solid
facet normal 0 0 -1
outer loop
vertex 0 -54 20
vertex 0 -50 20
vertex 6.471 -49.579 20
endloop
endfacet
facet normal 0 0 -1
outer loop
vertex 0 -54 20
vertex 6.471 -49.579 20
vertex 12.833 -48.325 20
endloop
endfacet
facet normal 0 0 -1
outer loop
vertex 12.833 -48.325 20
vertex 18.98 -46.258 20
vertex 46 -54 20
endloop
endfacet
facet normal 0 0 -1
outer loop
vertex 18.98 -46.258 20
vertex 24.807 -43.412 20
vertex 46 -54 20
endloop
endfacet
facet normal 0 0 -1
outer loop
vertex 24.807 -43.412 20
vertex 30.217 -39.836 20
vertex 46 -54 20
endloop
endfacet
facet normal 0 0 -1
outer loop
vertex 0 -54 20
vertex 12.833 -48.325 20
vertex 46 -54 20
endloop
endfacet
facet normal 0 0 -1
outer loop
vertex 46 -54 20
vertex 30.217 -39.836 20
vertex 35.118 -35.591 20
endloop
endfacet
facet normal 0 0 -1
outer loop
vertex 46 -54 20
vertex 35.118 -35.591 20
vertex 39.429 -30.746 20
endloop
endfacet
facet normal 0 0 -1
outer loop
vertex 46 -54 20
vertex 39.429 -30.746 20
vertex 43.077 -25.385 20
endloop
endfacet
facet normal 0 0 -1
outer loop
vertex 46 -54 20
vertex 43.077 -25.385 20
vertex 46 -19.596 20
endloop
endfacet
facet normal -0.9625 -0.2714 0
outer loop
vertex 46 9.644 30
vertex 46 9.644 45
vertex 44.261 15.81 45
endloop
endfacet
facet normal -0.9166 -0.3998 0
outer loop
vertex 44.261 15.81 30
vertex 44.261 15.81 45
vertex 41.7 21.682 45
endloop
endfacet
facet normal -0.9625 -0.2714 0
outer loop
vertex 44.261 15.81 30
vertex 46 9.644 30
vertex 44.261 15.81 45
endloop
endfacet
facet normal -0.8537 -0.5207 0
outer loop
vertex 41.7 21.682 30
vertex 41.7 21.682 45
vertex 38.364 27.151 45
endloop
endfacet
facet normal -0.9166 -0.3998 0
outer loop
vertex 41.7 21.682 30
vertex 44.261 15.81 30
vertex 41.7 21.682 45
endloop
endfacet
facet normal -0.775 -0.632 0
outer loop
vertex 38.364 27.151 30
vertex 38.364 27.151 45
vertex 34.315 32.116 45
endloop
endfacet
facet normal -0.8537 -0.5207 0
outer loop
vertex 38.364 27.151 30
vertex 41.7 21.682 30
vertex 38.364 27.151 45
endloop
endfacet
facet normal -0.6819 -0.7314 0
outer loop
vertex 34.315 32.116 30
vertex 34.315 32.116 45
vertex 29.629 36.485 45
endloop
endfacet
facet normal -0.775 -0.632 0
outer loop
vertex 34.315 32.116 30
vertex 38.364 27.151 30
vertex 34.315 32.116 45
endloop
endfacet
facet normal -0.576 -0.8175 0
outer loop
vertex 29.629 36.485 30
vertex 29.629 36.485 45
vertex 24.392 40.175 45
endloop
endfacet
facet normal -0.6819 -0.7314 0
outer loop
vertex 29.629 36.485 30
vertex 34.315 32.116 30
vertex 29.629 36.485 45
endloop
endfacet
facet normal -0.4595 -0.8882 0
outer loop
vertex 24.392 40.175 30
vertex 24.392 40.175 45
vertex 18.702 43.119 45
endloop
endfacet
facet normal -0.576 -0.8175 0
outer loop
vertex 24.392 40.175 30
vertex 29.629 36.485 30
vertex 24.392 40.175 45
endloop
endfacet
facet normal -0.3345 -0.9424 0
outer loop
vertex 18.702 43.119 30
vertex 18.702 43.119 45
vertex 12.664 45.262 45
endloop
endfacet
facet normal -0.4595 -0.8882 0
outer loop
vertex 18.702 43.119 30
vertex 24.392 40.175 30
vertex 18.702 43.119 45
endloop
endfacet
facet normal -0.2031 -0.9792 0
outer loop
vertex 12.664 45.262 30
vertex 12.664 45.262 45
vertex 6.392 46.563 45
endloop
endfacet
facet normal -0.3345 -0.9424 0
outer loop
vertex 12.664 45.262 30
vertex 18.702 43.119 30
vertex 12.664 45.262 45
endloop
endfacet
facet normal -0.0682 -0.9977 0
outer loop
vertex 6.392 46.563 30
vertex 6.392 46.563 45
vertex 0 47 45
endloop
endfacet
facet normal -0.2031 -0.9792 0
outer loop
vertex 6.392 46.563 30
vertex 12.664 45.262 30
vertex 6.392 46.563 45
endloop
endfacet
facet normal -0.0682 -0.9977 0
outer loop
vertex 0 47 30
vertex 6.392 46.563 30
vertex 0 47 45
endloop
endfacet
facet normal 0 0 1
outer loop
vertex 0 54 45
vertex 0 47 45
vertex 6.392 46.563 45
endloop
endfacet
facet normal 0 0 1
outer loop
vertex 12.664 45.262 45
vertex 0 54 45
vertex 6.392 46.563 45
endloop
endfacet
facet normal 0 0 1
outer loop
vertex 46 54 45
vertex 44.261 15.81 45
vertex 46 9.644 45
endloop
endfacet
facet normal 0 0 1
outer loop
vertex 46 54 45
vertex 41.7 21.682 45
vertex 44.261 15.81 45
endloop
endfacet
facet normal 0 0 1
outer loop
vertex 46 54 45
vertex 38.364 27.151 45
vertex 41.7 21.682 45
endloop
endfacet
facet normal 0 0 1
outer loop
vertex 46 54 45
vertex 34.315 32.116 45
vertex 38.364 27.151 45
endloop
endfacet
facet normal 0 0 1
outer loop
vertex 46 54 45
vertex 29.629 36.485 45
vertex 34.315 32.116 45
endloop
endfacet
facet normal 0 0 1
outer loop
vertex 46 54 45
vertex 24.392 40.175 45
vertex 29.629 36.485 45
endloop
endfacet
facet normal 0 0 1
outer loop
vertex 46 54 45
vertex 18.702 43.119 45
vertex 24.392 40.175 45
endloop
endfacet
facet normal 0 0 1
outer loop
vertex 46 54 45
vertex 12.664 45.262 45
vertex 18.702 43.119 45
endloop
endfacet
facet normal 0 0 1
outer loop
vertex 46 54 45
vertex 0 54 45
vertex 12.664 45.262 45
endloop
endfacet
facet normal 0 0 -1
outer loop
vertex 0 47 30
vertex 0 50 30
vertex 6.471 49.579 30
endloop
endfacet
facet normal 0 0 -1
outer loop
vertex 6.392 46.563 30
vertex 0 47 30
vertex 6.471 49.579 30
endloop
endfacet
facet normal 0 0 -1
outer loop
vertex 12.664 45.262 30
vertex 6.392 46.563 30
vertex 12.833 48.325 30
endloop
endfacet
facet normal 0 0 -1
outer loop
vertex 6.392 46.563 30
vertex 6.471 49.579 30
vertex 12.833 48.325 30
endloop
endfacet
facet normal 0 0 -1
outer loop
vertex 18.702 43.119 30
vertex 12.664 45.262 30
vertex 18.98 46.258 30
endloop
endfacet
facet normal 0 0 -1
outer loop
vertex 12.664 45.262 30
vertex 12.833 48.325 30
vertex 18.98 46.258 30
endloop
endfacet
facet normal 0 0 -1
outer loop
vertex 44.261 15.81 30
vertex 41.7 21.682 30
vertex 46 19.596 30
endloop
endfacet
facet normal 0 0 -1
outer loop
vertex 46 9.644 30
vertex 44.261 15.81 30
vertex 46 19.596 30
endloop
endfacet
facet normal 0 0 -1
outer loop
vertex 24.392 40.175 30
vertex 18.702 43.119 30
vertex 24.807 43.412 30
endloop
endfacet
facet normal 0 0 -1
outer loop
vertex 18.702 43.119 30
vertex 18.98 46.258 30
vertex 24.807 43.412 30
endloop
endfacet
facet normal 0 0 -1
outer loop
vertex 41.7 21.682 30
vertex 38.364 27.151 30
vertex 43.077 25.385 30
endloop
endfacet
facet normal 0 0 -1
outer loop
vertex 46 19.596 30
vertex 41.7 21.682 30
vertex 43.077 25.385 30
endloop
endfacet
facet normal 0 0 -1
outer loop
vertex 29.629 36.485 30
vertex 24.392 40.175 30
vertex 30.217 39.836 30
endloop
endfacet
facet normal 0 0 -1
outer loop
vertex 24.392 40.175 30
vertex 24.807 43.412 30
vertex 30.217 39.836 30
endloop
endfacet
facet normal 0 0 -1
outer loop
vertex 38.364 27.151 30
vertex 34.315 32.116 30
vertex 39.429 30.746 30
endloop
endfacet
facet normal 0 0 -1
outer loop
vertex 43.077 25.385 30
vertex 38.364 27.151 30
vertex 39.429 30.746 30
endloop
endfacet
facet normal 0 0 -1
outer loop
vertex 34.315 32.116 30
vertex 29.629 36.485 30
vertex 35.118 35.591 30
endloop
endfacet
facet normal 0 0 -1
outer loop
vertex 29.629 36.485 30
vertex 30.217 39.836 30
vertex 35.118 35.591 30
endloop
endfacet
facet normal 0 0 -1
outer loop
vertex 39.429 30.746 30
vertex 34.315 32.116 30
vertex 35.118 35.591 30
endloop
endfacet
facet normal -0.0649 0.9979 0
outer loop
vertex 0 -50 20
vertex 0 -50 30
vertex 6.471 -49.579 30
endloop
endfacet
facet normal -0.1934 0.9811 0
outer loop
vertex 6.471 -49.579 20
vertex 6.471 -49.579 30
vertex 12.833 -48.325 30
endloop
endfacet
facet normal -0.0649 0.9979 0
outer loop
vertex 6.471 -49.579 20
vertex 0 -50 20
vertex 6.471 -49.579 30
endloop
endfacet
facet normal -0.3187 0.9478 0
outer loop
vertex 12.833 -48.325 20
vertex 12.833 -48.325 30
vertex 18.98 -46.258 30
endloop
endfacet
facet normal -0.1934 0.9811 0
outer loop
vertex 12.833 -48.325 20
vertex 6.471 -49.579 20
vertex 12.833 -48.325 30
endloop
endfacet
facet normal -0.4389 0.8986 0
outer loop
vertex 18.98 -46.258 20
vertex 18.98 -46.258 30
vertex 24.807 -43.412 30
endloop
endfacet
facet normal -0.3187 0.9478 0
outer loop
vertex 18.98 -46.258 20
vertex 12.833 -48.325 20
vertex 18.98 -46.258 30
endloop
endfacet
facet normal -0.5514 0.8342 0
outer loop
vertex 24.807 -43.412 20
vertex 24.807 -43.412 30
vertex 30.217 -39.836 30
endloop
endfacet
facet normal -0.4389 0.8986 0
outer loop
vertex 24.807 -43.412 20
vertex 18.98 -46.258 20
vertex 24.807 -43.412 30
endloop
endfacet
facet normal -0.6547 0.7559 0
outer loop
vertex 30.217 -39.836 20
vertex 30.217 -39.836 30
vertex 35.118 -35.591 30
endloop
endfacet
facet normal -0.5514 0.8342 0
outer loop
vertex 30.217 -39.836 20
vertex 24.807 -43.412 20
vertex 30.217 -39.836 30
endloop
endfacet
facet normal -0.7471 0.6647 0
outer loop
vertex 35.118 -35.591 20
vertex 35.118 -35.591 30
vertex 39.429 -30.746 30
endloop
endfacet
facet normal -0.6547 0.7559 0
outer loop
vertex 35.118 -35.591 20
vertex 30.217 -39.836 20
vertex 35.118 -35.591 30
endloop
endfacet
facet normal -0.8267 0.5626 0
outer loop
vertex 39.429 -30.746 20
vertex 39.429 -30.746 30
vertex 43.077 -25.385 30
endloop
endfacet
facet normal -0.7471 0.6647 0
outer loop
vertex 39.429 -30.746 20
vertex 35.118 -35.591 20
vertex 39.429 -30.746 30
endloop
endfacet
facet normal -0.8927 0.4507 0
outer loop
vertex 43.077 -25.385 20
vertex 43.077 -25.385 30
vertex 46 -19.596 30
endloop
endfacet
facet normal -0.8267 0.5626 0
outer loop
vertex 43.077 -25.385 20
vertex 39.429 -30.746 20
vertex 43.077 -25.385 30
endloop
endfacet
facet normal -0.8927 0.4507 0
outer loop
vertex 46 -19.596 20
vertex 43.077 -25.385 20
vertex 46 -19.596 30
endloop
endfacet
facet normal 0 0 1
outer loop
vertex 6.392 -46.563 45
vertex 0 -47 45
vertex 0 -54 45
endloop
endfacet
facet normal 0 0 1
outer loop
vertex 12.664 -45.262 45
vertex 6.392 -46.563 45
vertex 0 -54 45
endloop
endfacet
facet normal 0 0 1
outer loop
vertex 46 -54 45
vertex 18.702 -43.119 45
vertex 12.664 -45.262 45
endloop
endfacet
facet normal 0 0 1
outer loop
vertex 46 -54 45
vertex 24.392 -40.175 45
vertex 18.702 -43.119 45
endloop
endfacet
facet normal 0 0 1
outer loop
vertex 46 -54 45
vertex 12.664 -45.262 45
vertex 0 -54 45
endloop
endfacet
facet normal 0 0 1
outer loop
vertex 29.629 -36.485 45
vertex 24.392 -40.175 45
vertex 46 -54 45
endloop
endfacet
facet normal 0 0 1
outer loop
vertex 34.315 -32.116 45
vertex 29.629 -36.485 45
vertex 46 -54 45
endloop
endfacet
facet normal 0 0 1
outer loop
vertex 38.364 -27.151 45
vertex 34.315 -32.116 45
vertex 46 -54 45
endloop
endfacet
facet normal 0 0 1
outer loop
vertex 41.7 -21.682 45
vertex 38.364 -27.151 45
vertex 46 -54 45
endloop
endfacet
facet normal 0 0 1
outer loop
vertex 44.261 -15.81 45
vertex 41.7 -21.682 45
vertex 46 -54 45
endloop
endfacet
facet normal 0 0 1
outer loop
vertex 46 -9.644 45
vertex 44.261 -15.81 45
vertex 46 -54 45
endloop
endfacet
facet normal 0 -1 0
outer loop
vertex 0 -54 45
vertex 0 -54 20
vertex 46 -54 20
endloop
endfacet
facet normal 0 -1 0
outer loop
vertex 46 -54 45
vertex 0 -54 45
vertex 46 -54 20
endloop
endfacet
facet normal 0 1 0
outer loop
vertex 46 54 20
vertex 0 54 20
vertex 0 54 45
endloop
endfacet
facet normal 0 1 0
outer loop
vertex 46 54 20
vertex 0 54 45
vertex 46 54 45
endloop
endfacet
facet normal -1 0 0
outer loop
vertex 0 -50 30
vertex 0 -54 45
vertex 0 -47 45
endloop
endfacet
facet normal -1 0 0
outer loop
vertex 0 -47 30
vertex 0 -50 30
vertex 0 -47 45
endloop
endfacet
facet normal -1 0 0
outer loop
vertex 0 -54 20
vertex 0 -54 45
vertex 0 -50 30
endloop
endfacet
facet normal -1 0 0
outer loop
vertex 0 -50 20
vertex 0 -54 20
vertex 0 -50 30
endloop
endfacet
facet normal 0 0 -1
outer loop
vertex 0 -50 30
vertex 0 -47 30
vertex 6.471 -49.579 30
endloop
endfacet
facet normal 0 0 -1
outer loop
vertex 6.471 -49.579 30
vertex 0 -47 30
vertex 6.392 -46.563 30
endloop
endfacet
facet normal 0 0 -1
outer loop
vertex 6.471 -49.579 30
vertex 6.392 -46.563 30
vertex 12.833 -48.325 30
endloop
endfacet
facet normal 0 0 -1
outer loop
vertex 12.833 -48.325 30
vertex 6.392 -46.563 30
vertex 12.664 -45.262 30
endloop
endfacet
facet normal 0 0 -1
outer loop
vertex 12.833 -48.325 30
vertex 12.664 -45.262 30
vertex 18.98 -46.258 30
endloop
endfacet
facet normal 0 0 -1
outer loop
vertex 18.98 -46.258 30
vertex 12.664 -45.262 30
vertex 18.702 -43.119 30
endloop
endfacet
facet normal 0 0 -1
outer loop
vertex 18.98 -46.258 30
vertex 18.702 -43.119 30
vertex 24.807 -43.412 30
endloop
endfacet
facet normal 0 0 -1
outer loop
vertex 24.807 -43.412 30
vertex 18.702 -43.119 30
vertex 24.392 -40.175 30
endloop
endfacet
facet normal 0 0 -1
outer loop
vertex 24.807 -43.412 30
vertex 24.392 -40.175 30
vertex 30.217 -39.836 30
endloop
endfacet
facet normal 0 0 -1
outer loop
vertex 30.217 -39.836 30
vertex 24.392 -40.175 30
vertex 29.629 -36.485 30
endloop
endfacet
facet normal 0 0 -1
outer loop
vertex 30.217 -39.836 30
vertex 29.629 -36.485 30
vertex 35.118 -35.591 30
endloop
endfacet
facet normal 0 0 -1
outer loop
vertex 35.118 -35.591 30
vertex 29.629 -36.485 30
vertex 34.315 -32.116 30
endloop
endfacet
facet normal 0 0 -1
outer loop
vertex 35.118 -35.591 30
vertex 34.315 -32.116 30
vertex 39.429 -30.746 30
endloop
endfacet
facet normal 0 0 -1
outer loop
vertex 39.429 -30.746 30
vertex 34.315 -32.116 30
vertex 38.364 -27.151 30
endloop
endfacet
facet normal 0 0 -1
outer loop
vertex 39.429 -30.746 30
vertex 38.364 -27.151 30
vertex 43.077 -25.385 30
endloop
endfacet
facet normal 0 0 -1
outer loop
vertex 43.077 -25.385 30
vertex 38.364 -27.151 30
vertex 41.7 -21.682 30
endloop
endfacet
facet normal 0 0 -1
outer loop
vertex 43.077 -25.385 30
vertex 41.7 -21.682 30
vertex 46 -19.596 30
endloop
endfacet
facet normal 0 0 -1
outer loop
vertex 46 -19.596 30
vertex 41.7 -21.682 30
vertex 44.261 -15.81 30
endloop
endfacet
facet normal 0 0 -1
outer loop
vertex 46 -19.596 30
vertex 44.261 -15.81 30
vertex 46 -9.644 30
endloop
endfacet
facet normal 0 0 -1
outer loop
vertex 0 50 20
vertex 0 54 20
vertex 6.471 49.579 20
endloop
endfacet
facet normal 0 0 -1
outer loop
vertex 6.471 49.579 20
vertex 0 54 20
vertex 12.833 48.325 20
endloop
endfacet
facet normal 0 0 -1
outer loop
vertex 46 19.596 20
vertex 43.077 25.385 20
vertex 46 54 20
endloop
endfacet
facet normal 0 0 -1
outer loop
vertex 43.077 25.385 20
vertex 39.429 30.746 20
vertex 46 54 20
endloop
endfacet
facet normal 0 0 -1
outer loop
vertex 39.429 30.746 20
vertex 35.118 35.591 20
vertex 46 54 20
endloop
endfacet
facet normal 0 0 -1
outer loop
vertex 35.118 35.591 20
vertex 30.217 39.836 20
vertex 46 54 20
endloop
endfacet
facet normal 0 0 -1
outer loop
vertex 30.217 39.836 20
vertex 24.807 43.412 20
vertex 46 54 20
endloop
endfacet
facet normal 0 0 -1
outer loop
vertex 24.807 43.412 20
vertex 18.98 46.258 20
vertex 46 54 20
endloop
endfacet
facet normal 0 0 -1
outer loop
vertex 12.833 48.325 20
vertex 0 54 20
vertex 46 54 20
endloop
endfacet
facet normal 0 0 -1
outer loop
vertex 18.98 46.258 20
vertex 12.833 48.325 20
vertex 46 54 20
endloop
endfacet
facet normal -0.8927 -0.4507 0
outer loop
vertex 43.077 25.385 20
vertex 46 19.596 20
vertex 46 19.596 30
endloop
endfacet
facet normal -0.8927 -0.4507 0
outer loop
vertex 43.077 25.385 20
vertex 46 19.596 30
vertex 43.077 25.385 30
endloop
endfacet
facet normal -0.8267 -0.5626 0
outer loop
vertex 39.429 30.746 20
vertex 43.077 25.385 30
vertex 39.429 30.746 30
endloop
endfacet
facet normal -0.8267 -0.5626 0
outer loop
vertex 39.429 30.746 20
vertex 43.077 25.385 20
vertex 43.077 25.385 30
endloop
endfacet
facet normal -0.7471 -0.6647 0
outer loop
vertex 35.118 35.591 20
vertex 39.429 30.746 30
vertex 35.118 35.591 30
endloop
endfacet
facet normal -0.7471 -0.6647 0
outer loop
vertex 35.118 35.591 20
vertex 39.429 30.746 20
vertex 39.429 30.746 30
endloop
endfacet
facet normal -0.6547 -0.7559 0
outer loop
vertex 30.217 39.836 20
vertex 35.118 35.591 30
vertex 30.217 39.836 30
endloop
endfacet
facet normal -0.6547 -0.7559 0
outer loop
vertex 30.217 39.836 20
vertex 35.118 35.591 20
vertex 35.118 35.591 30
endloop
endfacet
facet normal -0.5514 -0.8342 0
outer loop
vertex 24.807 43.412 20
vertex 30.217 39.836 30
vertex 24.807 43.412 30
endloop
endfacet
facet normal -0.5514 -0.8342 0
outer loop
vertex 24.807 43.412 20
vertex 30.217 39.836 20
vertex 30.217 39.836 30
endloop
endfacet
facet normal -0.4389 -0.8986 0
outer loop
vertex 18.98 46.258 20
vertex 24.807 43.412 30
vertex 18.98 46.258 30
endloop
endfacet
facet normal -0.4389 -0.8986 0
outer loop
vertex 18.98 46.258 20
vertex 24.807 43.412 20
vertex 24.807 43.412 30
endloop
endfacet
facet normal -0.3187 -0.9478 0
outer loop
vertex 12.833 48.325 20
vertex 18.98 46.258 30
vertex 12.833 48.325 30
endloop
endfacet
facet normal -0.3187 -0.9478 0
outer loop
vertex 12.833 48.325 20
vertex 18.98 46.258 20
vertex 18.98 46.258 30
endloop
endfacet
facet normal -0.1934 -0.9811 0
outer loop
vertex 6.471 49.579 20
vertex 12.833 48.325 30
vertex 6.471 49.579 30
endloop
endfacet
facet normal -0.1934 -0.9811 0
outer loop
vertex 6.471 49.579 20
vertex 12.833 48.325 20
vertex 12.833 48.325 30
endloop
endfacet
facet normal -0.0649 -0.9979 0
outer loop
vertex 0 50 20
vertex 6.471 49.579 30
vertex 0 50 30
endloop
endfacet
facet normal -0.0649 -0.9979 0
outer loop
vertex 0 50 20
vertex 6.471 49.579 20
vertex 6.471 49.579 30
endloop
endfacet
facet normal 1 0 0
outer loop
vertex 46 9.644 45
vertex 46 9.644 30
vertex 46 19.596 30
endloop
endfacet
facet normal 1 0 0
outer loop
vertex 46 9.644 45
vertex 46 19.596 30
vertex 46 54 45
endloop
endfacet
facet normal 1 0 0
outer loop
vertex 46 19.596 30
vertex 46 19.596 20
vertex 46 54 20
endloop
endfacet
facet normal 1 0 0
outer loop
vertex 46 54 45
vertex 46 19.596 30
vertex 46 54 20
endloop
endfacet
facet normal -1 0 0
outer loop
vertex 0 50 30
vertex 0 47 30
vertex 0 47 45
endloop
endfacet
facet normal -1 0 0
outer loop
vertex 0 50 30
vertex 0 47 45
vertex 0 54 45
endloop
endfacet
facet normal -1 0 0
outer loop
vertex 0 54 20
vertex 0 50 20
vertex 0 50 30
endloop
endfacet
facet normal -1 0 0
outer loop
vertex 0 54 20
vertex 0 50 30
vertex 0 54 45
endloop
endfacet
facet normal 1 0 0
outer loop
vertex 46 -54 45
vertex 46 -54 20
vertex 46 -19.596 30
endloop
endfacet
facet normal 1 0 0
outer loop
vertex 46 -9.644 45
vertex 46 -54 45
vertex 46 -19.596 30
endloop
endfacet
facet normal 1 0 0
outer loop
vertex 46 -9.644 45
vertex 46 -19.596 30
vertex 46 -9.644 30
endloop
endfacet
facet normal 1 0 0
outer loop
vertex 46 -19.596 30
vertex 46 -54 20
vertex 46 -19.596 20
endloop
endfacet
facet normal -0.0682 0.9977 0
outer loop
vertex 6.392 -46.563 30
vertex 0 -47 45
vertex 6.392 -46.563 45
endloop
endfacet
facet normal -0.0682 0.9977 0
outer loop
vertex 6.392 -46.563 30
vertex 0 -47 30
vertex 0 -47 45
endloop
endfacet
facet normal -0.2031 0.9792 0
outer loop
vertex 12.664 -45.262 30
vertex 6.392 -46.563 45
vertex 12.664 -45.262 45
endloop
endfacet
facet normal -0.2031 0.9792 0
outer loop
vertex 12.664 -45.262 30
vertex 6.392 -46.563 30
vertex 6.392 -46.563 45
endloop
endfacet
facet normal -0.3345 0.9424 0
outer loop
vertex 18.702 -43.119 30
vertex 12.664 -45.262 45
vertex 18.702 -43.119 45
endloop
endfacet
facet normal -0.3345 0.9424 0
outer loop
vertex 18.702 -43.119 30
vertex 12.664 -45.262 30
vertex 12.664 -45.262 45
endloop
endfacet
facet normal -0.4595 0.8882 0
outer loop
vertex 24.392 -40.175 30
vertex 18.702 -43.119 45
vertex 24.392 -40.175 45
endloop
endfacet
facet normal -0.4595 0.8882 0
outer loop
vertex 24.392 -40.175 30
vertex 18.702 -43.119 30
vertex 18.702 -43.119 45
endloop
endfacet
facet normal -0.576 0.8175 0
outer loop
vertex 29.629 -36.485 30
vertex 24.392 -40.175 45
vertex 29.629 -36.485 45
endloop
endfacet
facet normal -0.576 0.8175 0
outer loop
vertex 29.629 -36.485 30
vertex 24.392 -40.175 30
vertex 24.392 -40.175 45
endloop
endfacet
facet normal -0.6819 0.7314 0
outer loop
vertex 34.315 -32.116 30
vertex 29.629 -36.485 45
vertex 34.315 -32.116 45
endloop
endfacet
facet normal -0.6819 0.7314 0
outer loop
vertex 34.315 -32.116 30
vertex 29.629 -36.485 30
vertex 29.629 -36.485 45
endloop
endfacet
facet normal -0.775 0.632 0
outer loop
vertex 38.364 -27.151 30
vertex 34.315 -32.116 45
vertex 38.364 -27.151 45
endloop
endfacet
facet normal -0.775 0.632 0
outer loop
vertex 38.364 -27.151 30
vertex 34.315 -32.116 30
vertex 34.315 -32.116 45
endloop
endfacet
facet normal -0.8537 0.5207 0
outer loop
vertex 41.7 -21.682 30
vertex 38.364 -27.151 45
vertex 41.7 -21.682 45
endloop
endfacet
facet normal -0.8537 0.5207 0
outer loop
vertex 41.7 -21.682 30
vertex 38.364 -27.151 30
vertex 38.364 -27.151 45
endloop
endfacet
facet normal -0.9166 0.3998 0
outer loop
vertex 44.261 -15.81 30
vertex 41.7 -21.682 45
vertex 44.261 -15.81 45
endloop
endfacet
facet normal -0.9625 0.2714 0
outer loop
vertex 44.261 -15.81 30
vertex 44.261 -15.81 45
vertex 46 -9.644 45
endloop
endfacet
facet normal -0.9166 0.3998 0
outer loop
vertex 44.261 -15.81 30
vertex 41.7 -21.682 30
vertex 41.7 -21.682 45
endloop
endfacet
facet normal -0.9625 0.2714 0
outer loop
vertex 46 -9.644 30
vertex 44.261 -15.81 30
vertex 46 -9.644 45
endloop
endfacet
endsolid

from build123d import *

# Parameters (mm, degrees)
TUBE110_R          = 50
TUBE110_R_2        = 40
TUBE110_DEPTH      = 10
CYLINDER1173_R     = 47
CYLINDER1173_DEPTH = 25
BOX480_W           = 46
BOX480_H           = 108
BOX480_DEPTH       = 25


with BuildPart() as tube110:
    # Tube110 → Tube110 (new body)
    with BuildSketch(Plane.XY.offset(20)):
        Circle(TUBE110_R)
        Circle(TUBE110_R_2, mode=Mode.SUBTRACT)
    extrude(amount=TUBE110_DEPTH)


with BuildPart() as v_lec1173:
    # Cylinder1173 → Cylinder1173 (new body)
    with BuildSketch(Plane.XY.offset(20)):
        Circle(CYLINDER1173_R)
    extrude(amount=CYLINDER1173_DEPTH)


with BuildPart() as cut436:
    # Box480 → Box480 (new body)
    with BuildSketch(Plane(origin=(0, -54, 20), x_dir=(1, 0, 0), z_dir=(0, 0, 1))):
        with Locations((23, 54)):
            Rectangle(BOX480_W, BOX480_H)
    extrude(amount=BOX480_DEPTH)

    # Cut435: cut Válec1173
    add(v_lec1173.part, mode=Mode.SUBTRACT)

    # Cut436: cut Tube110
    add(tube110.part, mode=Mode.SUBTRACT)


solid = cut436.part
